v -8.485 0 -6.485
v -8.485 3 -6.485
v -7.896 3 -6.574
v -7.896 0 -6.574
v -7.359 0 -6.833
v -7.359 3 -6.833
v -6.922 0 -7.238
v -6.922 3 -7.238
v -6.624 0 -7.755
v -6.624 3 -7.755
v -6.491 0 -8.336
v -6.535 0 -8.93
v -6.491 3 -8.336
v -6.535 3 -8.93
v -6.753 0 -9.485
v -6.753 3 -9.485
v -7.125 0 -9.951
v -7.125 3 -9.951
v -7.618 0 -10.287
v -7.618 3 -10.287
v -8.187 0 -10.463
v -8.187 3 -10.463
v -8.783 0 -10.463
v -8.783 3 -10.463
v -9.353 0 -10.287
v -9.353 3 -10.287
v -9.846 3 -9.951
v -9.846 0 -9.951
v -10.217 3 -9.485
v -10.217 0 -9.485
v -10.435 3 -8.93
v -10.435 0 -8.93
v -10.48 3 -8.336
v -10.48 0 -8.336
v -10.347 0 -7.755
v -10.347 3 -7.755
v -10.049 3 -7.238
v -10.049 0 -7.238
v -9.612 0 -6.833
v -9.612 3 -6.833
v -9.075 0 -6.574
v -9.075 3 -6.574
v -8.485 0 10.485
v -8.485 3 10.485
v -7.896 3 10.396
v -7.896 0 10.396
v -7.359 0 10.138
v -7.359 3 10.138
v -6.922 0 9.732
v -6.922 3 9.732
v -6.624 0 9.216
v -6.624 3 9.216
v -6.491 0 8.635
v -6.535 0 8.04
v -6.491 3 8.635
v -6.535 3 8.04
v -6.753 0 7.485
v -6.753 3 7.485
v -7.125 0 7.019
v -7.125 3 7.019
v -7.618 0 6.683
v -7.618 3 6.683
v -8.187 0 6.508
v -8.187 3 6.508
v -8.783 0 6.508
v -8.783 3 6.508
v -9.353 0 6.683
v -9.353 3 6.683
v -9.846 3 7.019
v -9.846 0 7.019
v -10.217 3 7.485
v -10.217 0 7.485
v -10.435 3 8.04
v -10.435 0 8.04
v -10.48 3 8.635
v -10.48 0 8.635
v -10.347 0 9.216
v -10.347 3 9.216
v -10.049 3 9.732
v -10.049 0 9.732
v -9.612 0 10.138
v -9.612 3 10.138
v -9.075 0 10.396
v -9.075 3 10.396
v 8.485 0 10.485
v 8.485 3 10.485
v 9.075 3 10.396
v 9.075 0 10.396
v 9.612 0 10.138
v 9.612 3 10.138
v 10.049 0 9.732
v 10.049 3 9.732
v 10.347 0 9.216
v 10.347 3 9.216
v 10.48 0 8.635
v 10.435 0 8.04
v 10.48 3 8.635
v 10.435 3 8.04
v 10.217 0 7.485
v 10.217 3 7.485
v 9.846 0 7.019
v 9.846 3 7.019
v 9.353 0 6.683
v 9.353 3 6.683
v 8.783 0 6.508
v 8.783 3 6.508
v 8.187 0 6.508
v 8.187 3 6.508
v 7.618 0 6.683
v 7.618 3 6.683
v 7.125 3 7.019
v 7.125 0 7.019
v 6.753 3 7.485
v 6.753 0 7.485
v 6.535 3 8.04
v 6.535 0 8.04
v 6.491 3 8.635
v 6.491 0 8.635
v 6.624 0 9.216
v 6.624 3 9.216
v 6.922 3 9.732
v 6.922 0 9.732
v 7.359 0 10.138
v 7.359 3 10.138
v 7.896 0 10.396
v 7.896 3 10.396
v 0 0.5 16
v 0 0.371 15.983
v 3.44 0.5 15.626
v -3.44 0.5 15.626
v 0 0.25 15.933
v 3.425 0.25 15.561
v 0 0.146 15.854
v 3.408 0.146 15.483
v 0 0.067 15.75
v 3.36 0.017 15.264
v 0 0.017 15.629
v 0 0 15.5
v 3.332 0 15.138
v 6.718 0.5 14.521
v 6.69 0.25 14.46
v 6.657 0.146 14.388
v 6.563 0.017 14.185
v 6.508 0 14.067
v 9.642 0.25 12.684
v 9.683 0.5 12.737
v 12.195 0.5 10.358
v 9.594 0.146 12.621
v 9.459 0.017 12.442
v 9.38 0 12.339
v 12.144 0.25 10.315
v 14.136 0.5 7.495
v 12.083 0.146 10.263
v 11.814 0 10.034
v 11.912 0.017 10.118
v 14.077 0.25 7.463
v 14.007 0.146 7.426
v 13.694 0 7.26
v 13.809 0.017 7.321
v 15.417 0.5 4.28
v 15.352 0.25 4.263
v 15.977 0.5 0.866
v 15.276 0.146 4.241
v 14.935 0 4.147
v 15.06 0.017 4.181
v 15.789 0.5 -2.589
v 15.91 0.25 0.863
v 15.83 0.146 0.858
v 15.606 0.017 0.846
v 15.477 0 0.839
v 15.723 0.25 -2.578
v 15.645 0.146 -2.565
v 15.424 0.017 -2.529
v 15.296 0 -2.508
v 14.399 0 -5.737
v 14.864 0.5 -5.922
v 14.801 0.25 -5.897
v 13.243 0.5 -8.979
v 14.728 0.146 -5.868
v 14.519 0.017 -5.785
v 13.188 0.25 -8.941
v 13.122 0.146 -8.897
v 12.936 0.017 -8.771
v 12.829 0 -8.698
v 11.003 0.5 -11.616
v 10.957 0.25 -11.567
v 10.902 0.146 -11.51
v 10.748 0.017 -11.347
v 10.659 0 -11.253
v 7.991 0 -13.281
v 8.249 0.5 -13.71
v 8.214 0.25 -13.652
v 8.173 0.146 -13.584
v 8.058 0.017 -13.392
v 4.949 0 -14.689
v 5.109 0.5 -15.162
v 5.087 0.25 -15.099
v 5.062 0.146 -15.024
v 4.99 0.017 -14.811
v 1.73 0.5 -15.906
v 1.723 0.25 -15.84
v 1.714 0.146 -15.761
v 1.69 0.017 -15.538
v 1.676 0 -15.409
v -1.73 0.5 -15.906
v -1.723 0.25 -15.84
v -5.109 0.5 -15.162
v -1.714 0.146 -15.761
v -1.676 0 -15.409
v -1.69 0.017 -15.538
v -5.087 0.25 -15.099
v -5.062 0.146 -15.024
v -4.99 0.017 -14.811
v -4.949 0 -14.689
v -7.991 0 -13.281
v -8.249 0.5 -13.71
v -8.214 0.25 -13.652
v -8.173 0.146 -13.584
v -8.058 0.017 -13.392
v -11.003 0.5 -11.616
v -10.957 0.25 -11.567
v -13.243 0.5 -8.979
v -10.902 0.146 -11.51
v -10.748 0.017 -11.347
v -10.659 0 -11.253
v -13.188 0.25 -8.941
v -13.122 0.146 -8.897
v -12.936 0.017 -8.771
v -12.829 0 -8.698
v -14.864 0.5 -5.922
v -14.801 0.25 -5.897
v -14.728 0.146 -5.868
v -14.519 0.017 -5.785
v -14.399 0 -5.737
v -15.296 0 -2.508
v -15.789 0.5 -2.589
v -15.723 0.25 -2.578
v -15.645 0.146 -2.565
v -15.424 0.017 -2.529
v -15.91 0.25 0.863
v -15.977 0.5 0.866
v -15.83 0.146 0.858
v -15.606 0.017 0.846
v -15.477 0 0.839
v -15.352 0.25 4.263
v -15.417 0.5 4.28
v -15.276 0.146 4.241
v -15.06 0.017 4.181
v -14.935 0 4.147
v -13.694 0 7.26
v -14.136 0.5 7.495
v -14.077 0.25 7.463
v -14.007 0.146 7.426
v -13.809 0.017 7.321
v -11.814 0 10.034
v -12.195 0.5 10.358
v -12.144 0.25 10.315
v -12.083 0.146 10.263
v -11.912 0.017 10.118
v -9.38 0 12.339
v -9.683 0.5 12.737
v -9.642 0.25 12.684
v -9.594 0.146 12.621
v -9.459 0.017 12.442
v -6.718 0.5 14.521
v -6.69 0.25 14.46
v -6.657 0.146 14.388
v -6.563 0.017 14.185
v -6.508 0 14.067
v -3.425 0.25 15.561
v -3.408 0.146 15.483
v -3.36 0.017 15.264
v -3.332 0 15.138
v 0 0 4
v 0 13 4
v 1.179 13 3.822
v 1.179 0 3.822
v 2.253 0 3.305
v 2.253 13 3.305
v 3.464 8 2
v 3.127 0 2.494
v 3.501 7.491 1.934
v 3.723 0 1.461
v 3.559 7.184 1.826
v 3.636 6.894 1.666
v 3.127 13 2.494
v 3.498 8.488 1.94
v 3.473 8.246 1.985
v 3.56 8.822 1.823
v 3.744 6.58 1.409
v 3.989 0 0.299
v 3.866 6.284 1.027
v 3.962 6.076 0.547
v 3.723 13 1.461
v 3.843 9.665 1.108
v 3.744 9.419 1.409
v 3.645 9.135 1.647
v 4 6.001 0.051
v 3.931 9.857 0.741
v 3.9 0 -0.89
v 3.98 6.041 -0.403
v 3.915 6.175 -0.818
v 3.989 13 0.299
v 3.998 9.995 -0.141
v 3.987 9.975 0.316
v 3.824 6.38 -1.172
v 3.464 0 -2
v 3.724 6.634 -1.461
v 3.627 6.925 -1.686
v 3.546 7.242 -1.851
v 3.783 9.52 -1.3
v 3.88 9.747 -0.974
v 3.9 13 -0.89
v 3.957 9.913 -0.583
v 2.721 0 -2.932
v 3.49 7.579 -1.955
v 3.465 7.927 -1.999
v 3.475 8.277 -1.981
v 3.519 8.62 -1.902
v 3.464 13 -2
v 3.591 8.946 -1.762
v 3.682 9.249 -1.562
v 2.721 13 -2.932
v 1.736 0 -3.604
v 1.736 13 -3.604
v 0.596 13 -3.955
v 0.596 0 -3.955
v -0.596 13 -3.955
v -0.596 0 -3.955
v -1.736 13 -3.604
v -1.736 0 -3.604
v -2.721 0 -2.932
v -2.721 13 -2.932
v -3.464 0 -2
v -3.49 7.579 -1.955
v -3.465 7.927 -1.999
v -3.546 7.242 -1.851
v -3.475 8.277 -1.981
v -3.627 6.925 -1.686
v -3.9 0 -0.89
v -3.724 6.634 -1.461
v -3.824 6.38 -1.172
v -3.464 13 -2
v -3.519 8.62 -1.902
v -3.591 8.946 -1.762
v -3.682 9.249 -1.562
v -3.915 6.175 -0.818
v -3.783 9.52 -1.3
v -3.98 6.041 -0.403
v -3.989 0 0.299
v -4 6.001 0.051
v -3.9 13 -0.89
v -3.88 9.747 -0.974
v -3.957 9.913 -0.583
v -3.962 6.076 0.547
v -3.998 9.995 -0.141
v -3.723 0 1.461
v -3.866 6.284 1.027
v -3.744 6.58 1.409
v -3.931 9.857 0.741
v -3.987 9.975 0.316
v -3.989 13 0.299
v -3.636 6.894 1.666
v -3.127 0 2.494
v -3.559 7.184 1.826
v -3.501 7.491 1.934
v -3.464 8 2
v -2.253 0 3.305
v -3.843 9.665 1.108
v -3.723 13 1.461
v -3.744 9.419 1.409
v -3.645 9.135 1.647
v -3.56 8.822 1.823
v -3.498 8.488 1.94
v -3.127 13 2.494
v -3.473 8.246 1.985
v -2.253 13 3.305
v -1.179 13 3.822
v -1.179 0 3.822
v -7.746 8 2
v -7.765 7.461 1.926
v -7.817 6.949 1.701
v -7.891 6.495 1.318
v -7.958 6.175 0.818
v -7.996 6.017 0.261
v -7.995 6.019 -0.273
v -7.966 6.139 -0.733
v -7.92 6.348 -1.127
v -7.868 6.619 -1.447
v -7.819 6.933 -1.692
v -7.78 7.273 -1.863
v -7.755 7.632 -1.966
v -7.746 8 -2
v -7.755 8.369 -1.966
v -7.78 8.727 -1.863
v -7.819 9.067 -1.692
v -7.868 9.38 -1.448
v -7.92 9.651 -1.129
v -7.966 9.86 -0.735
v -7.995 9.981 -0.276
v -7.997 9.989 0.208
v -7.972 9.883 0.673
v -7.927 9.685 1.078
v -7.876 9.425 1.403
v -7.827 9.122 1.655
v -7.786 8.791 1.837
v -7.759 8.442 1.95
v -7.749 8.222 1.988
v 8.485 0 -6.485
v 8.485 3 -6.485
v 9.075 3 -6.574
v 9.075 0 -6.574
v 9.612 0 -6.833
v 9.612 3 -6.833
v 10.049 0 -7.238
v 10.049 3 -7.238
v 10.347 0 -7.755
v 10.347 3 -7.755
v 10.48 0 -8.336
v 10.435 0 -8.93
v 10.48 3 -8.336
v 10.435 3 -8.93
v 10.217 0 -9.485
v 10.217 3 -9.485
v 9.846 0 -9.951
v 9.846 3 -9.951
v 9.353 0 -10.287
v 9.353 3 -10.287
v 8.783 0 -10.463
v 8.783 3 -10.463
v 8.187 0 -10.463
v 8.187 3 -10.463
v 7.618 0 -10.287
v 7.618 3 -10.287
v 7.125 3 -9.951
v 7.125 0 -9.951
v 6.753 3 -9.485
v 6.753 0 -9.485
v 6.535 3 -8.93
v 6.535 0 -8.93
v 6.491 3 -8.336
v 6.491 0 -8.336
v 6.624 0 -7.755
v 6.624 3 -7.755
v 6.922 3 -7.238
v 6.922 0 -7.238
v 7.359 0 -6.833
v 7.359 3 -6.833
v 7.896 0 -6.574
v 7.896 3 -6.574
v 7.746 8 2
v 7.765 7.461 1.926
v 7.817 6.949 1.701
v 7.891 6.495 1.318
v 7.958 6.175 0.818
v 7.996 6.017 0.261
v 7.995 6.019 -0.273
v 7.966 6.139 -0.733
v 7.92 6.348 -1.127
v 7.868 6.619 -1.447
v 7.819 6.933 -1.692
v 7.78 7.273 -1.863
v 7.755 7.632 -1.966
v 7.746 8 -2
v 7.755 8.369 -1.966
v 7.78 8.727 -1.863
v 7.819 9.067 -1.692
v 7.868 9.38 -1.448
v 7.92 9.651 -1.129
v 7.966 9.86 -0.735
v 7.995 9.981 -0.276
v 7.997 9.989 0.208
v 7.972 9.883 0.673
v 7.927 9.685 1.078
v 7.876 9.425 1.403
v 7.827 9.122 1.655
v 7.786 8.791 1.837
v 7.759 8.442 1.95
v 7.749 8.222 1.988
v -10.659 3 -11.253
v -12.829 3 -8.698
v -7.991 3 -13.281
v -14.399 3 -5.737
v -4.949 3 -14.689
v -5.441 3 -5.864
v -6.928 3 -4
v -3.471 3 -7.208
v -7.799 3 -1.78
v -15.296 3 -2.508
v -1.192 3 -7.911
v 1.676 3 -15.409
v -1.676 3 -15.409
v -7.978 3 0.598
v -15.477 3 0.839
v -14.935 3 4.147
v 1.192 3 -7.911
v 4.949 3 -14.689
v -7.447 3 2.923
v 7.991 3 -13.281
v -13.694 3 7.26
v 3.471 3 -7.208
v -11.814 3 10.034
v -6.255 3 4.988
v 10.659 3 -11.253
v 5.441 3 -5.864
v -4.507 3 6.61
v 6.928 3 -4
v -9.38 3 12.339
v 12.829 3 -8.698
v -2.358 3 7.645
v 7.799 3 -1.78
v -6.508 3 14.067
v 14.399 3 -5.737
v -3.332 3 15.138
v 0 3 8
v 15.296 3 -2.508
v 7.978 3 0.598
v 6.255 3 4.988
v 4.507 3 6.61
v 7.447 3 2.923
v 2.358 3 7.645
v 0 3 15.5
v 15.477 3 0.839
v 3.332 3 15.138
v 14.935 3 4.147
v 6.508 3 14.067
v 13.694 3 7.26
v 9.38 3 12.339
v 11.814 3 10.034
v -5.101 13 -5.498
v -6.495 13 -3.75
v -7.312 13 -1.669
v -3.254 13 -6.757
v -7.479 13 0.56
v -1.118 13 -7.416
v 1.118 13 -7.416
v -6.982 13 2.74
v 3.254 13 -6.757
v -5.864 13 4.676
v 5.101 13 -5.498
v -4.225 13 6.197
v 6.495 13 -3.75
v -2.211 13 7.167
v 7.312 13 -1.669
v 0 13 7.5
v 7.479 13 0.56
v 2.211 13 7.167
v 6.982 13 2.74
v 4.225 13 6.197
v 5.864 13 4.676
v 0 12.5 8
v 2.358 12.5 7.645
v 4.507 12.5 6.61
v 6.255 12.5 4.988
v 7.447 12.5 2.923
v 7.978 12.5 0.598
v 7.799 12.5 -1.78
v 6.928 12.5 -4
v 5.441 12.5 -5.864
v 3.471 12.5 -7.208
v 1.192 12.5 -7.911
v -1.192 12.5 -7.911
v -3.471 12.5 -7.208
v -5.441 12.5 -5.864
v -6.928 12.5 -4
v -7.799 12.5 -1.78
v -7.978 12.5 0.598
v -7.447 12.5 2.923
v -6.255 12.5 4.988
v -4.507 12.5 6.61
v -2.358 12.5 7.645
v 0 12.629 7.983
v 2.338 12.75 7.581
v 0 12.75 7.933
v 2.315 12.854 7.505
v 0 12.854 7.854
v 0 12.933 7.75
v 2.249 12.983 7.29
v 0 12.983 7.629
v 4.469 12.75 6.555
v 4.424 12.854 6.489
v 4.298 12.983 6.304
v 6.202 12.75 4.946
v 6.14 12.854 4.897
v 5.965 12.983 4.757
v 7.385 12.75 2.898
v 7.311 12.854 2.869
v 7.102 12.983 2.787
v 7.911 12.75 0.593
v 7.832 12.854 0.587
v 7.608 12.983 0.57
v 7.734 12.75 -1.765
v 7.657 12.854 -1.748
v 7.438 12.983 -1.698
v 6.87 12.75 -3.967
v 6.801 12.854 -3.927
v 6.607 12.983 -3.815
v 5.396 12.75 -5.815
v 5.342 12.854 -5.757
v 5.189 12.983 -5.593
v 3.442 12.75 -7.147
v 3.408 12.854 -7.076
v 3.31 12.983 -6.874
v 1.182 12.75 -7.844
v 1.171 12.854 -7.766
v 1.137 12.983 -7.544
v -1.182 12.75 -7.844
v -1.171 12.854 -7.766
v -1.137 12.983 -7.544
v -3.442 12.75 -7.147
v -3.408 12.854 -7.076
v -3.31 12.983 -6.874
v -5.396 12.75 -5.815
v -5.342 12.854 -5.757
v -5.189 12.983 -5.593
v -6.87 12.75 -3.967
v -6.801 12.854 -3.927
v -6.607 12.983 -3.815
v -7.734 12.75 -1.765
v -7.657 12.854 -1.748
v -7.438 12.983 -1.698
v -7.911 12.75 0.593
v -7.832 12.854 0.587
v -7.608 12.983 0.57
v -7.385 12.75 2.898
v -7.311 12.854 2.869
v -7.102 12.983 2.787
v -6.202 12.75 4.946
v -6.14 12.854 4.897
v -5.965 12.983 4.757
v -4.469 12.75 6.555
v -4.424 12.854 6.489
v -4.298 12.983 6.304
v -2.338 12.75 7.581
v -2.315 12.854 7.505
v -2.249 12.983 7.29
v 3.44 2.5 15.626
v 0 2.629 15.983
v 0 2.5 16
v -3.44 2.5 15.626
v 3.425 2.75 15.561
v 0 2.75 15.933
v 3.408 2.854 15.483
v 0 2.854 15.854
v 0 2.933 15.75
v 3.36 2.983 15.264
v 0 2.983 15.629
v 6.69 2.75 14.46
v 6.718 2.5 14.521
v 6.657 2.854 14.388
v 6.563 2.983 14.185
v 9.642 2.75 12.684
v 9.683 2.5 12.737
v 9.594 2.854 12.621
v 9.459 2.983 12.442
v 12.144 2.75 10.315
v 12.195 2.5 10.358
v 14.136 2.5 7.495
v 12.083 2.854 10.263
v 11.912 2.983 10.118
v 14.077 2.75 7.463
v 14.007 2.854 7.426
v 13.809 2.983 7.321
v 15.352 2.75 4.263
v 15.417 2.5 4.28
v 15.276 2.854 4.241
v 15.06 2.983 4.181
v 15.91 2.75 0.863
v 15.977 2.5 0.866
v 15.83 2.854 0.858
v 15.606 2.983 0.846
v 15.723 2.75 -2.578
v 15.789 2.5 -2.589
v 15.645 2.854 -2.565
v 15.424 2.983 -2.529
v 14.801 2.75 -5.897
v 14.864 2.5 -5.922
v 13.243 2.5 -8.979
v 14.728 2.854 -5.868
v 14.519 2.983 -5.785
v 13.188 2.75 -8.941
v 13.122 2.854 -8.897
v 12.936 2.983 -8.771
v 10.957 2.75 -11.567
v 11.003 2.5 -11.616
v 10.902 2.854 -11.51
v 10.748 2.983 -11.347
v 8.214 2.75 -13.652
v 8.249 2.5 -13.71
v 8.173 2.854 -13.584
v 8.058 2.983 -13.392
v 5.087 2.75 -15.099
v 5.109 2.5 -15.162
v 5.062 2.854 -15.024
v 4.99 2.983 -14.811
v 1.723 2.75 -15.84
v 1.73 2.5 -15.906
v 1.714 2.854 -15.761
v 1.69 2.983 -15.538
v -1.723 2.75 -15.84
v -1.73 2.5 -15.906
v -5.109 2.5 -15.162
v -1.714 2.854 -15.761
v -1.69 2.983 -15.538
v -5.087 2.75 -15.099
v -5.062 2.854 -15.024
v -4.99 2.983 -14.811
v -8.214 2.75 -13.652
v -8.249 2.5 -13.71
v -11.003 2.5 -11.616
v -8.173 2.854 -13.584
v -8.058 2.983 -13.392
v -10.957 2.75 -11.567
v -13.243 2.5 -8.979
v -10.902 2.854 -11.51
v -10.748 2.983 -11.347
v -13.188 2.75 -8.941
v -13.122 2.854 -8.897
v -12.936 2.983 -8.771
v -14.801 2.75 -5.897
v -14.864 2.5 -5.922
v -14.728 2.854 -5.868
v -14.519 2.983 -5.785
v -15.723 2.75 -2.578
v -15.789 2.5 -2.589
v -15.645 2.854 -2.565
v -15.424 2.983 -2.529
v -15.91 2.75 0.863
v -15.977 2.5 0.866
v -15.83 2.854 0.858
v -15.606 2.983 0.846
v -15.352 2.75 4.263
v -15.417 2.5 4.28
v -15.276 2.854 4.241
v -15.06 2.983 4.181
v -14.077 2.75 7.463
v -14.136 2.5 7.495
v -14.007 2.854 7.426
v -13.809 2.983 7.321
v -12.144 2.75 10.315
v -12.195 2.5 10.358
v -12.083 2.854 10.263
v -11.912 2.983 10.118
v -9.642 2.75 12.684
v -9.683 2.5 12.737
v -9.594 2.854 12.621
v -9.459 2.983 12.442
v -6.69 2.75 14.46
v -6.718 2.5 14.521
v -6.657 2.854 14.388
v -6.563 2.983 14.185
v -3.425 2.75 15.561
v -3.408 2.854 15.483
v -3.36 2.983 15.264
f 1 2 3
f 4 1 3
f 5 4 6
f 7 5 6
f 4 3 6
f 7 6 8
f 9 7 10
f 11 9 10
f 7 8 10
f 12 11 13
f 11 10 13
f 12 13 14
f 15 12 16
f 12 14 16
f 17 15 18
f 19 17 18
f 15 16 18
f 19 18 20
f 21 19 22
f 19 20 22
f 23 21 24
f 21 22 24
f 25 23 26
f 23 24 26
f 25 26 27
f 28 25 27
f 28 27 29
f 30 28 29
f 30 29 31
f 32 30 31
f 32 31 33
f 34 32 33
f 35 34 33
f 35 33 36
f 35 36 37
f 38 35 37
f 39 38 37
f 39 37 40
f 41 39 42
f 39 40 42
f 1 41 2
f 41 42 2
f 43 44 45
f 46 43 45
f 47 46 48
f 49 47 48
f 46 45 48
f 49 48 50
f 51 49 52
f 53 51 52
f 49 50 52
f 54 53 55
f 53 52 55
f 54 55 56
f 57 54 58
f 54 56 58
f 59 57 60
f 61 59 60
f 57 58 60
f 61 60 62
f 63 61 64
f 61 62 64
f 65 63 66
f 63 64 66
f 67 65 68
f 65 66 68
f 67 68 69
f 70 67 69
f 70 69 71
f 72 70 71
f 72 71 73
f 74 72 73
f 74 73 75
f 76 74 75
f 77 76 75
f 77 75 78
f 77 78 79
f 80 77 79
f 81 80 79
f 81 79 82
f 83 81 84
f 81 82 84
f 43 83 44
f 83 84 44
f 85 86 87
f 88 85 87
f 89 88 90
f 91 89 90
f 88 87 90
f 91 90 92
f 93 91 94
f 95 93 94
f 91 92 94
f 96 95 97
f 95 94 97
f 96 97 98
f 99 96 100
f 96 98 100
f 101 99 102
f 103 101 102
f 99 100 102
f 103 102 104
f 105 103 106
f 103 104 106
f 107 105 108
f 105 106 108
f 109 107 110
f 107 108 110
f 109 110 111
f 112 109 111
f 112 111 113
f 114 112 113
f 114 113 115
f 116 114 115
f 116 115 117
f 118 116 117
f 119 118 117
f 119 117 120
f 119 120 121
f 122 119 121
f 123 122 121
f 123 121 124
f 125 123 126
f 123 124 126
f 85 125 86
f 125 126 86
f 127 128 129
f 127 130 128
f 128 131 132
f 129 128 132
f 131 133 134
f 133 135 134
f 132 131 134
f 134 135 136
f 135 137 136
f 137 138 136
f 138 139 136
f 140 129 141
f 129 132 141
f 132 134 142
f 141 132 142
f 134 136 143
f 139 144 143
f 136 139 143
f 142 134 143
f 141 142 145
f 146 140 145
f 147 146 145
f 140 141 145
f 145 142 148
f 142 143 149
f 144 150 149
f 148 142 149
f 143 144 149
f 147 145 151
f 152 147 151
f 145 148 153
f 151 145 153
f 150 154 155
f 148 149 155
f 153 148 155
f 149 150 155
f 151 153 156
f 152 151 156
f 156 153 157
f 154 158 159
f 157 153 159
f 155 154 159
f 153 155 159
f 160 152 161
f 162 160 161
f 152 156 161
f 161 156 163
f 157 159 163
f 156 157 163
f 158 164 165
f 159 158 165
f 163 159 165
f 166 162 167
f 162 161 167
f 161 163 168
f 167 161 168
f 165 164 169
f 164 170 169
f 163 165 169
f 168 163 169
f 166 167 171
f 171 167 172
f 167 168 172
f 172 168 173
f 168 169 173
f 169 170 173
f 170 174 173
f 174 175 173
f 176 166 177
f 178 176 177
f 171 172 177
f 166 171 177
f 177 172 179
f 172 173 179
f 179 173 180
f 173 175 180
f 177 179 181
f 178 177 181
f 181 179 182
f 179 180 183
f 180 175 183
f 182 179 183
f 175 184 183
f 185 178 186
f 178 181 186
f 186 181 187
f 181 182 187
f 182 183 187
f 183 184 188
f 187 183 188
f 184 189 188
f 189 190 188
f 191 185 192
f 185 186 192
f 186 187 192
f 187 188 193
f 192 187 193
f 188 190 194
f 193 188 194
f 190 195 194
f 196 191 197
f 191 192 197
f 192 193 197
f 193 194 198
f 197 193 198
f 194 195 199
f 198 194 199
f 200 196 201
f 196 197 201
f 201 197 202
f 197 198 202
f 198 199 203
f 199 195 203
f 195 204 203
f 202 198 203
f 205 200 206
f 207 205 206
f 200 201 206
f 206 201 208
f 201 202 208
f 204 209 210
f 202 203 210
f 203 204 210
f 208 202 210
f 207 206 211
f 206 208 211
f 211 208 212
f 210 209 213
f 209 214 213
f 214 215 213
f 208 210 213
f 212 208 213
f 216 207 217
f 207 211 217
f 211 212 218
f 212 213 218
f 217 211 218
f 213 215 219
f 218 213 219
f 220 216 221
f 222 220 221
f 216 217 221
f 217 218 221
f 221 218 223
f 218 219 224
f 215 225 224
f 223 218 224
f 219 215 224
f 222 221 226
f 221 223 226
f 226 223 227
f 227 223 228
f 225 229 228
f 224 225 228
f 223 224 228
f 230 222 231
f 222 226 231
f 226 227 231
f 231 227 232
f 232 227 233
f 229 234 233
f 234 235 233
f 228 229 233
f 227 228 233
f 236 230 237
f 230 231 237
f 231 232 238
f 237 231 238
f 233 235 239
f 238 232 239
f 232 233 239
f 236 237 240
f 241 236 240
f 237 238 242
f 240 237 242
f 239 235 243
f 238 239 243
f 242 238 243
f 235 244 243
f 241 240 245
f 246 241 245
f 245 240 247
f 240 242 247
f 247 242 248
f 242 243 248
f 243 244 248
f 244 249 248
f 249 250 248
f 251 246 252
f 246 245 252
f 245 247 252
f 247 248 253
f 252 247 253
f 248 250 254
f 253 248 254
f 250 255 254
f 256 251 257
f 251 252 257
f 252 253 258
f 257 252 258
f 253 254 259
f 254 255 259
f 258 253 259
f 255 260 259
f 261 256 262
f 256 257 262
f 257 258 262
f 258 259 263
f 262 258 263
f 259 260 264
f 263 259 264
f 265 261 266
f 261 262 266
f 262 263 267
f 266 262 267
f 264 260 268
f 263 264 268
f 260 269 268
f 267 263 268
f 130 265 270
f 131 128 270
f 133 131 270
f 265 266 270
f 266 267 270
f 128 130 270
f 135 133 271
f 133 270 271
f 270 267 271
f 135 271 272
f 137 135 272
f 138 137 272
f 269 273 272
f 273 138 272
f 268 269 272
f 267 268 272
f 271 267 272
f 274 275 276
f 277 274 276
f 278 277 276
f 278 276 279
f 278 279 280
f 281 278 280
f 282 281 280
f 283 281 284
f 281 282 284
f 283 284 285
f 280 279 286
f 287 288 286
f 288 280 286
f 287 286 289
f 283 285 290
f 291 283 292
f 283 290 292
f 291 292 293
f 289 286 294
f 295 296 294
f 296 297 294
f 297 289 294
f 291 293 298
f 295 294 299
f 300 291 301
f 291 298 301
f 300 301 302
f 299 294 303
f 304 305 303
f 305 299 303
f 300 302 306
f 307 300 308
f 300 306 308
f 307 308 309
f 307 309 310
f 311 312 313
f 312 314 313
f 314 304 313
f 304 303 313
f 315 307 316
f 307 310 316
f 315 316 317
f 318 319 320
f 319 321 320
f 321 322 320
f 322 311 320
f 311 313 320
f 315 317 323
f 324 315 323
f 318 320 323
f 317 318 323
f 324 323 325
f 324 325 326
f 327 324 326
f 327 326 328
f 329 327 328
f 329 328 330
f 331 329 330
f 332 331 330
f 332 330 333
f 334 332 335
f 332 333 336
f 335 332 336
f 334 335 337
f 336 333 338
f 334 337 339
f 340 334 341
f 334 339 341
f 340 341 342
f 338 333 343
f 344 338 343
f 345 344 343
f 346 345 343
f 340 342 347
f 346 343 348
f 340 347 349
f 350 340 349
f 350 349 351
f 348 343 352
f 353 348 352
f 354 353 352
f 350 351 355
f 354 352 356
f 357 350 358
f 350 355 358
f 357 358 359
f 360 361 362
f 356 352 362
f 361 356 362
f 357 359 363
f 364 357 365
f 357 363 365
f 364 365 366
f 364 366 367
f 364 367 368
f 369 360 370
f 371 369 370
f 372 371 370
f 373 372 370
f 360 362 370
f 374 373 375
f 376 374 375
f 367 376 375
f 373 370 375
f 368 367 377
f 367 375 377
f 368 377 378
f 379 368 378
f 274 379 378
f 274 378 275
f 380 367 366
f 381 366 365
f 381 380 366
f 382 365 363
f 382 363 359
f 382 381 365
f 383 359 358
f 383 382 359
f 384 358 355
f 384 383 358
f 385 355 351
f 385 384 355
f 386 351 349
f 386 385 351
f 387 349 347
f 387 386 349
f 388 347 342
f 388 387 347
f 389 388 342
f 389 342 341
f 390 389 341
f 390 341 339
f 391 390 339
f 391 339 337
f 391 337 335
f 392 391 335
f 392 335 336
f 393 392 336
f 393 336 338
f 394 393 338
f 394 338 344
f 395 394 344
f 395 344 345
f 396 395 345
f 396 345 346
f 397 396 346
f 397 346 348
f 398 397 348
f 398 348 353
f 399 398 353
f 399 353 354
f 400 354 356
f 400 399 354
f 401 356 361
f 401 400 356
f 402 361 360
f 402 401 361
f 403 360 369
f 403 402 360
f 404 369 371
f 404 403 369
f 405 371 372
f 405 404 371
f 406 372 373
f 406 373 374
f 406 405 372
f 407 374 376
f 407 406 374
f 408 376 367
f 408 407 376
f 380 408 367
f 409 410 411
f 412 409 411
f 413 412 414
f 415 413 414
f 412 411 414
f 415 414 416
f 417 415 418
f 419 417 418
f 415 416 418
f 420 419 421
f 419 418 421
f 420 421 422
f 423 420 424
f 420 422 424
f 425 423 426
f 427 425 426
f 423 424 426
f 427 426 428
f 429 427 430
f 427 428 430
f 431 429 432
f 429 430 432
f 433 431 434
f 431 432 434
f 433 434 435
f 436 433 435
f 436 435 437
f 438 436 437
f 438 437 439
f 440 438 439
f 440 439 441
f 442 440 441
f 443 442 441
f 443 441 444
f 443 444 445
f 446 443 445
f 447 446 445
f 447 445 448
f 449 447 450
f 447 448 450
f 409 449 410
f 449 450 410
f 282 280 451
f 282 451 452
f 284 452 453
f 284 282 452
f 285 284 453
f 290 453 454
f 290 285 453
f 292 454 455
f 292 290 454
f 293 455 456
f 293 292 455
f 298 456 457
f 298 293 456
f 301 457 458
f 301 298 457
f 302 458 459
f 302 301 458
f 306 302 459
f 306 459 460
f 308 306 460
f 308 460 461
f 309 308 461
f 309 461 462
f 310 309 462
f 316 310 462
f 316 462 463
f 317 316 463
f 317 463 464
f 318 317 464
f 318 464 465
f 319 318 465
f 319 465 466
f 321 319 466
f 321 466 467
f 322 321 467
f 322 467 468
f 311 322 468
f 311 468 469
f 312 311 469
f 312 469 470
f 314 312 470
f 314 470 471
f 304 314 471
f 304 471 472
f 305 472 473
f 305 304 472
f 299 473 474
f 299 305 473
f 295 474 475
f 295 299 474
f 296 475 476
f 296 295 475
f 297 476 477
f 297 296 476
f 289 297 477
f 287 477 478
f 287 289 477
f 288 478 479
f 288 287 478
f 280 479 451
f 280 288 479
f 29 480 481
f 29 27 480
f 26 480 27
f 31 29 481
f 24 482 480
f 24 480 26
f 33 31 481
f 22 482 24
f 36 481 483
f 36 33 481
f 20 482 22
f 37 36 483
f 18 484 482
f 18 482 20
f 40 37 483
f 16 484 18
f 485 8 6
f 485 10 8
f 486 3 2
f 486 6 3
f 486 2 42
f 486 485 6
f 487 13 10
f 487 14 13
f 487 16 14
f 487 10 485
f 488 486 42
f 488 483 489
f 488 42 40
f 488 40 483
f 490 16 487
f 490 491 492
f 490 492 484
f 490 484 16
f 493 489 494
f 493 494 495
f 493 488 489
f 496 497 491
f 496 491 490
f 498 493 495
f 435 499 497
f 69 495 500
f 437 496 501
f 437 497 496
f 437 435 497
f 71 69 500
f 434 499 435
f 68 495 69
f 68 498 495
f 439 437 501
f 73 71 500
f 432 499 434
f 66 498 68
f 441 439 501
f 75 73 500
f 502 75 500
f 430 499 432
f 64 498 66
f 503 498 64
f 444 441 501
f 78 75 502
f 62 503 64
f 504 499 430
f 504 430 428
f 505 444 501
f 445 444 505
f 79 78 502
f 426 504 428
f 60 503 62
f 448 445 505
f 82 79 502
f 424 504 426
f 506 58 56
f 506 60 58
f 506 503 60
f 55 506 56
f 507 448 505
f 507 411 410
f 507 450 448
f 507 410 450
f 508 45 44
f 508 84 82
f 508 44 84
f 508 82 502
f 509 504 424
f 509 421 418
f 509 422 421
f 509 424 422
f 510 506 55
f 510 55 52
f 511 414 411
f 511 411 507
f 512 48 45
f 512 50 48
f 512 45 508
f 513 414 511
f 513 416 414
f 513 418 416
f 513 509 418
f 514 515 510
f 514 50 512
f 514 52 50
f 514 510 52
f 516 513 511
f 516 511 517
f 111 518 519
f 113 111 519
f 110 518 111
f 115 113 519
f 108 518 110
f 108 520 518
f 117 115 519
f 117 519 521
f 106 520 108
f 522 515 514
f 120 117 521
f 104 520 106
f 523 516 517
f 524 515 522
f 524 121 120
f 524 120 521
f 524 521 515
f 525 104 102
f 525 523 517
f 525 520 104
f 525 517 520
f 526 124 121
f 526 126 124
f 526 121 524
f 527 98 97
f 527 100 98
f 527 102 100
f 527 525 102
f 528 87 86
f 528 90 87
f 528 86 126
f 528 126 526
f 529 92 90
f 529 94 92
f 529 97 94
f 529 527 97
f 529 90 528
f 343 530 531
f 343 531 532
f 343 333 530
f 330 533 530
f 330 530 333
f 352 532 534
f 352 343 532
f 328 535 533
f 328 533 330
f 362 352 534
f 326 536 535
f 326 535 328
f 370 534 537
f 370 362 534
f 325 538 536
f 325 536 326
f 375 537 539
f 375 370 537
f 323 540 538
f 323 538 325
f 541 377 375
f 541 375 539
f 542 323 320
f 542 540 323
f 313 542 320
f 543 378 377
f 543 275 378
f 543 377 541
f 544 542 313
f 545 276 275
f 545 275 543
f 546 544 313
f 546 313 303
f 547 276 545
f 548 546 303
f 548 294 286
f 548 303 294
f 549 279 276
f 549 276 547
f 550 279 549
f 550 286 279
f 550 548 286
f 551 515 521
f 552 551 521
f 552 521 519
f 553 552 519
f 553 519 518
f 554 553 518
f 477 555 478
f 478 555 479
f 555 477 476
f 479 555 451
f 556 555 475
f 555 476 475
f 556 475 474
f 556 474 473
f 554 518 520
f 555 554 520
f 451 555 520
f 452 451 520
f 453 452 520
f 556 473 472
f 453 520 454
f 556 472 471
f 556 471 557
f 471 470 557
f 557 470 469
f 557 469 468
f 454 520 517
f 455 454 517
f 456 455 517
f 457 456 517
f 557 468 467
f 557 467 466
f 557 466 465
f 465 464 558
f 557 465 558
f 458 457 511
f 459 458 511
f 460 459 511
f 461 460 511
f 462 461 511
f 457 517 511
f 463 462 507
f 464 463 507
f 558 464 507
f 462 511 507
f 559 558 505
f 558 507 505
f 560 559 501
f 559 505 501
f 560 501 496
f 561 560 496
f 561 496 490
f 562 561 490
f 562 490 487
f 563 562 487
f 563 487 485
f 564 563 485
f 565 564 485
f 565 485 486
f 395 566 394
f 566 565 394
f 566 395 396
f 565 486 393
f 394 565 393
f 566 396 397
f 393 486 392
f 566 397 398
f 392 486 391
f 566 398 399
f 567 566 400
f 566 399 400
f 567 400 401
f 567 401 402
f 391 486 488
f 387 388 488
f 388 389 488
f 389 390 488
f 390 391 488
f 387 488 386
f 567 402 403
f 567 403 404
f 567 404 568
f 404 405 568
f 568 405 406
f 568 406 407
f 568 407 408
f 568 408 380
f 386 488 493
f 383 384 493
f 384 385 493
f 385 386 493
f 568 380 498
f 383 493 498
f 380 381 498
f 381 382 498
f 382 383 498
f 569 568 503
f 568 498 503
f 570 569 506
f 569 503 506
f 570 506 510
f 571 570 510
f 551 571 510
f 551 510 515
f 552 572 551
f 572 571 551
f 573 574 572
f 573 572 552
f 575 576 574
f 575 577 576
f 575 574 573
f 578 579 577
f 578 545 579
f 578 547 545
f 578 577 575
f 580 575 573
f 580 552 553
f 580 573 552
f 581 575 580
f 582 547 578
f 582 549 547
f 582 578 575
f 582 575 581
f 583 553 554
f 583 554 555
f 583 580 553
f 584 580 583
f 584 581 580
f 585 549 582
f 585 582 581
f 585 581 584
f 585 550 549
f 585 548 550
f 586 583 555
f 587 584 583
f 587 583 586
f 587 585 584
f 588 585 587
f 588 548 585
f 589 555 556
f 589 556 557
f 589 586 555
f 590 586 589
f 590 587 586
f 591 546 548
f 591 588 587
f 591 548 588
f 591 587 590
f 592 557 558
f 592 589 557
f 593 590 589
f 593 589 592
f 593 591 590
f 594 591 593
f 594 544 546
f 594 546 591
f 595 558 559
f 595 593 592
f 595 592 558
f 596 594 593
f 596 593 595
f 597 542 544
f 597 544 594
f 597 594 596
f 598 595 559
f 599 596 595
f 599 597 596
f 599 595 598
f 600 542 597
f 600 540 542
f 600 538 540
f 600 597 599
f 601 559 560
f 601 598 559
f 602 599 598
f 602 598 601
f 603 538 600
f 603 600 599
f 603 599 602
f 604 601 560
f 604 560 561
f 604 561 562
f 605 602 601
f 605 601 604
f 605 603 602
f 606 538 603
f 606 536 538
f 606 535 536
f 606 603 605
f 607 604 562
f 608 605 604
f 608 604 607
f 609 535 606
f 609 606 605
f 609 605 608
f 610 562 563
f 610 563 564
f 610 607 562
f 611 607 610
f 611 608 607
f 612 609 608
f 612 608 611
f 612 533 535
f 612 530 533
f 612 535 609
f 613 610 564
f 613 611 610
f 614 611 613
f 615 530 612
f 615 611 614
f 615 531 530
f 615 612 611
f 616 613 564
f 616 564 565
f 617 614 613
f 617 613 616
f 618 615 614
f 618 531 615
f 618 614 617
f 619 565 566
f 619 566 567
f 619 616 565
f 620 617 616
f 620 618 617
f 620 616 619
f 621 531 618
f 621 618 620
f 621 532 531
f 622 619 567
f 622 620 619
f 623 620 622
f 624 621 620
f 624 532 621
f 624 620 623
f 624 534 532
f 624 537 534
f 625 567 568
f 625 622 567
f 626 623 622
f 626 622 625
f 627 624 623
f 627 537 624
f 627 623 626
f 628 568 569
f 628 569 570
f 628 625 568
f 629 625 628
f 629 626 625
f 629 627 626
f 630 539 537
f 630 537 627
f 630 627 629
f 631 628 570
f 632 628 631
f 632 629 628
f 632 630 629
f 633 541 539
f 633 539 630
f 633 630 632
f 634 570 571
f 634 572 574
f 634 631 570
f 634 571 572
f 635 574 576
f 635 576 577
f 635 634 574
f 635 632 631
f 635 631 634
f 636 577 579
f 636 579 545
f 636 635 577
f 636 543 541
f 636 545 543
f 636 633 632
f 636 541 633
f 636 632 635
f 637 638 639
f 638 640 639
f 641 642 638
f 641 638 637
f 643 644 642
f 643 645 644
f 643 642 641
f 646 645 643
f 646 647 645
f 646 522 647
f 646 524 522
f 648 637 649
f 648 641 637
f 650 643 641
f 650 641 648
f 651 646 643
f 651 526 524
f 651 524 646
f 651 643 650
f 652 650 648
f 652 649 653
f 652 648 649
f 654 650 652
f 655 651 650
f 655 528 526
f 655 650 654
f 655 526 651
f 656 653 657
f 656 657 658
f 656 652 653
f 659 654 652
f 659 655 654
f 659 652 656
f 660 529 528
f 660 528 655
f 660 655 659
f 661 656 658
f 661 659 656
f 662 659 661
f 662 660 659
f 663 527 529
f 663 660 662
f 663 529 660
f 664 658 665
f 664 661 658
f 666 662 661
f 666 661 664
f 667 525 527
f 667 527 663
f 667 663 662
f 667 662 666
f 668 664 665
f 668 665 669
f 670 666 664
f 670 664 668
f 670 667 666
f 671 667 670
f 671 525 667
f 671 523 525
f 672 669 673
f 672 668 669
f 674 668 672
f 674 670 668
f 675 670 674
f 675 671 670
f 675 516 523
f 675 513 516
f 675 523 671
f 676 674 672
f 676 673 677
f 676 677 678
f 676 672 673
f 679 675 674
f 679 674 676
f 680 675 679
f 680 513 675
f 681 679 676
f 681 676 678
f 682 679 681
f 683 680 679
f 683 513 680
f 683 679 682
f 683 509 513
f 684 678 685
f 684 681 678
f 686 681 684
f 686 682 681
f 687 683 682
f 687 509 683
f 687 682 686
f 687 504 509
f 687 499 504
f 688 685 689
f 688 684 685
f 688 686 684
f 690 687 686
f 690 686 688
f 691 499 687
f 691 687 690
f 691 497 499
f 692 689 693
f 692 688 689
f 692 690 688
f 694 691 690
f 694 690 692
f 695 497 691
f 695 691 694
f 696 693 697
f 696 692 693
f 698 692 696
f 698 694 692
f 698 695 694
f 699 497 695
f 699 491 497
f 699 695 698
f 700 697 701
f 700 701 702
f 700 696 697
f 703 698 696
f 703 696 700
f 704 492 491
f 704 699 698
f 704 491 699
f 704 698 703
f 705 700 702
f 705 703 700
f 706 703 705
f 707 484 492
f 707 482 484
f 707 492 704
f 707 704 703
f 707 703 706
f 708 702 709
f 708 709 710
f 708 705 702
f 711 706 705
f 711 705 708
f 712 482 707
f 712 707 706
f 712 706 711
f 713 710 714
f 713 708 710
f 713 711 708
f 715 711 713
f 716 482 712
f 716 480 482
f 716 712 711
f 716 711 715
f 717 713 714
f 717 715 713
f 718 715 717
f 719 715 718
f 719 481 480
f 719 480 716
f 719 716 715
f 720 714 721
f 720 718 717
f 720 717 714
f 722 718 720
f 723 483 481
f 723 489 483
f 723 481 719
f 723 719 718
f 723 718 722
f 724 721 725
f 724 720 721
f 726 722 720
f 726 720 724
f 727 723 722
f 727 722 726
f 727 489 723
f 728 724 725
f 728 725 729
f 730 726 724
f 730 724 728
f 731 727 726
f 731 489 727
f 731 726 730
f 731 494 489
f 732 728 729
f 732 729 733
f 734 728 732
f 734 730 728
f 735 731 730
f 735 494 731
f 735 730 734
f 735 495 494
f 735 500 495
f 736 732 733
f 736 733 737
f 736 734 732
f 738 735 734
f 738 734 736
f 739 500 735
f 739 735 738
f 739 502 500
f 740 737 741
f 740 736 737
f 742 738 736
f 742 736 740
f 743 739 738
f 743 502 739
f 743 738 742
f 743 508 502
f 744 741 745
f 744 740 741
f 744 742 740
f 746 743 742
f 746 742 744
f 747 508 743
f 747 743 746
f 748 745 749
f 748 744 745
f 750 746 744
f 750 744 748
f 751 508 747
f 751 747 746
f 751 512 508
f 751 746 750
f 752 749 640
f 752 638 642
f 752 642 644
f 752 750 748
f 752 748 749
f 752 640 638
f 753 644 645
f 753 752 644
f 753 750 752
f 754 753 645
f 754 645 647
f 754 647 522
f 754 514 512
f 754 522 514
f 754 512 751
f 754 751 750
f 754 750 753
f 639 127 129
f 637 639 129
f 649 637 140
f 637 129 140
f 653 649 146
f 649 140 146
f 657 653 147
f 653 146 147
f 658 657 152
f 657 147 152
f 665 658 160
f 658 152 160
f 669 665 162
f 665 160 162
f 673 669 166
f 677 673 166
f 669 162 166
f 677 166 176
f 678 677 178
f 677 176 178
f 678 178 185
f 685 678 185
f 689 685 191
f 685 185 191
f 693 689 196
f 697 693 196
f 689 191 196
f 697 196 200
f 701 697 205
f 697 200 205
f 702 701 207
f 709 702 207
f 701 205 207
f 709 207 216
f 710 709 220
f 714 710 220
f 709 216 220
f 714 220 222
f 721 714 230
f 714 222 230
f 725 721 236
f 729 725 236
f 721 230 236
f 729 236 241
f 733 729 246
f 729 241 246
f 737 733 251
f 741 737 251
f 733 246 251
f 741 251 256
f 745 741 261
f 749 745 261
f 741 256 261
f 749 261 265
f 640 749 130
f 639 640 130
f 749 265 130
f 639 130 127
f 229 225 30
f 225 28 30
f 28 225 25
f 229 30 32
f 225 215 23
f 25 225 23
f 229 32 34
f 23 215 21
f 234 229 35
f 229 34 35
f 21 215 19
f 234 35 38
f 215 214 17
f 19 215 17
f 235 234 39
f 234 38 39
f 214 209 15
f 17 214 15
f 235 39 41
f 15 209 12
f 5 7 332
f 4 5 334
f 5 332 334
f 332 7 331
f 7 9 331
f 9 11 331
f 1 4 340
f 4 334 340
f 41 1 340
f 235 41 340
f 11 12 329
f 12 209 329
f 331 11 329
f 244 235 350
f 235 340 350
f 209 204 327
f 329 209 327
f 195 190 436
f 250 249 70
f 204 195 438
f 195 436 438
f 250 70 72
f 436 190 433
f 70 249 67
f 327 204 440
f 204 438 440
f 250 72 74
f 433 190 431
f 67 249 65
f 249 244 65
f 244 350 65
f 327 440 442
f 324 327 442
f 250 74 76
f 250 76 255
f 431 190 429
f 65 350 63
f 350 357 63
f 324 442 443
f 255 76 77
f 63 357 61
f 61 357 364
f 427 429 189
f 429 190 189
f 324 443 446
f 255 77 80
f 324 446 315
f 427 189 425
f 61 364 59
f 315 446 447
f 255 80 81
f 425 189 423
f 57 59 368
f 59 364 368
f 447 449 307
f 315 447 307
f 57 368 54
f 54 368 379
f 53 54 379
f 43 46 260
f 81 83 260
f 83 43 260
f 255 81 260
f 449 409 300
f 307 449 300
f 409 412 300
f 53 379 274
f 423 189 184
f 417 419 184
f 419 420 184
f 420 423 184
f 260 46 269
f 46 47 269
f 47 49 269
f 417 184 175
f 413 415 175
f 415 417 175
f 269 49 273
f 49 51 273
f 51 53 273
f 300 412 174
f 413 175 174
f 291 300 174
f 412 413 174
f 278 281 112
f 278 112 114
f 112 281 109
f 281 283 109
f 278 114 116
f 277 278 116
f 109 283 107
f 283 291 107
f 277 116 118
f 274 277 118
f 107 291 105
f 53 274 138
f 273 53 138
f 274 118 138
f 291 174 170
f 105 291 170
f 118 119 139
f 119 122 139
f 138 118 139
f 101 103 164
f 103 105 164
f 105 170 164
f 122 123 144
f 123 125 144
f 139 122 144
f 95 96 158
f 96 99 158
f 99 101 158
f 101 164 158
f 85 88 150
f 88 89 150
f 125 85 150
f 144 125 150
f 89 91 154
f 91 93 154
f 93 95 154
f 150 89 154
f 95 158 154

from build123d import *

# Parameters (mm, degrees)
SKETCH1_R               = 16
BOSS_EXTRUDE1_DEPTH     = 3
SKETCH2_R               = 8
BOSS_EXTRUDE2_DEPTH     = 10
SKETCH3_R               = 4
CUT_EXTRUDE1_DEPTH      = 13
SKETCH4_R               = 2
CUT_EXTRUDE3_DEPTH      = 3
CUT_EXTRUDE4_DEPTH      = 10
CUT_EXTRUDE4_DEPTH_BACK = 24
SKETCH6_R               = 2
FILLET1_R               = 0.5
FILLET3_R               = 0.5


with BuildPart() as part:
    # Sketch1 → Boss-Extrude1 (new body)
    with BuildSketch(Plane(origin=(0, 0, 0), x_dir=(1, 0, 0), z_dir=(0, 1, 0))):
        with Locations(Location((0, 0, 0), (0, 0, 270))):
            Circle(SKETCH1_R)
    extrude(amount=BOSS_EXTRUDE1_DEPTH)

    # Sketch2 → Boss-Extrude2 (add)
    with BuildSketch(Plane(origin=(0, 3, 0), x_dir=(1, 0, 0), z_dir=(0, 1, 0))):
        with Locations(Location((0, 0, 0), (0, 0, 270))):
            Circle(SKETCH2_R)
    extrude(amount=BOSS_EXTRUDE2_DEPTH)

    # Sketch3 → Cut-Extrude1 (cut)
    with BuildSketch(Plane(origin=(0, 13, 0), x_dir=(1, 0, 0), z_dir=(0, 1, 0))):
        with Locations(Location((0, 0, 0), (0, 0, 270))):
            Circle(SKETCH3_R)
    extrude(amount=-CUT_EXTRUDE1_DEPTH, mode=Mode.SUBTRACT)

    # Sketch4 → Cut-Extrude3 (cut)
    with BuildSketch(Plane(origin=(0, 3, 0), x_dir=(1, 0, 0), z_dir=(0, 1, 0))):
        with Locations(Location((8.485281374, 8.485281374, 0), (0, 0, 270))):
            Circle(SKETCH4_R)
        with Locations(Location((8.485281374, -8.485281374, 0), (0, 0, 270))):
            Circle(SKETCH4_R)
        with Locations(Location((-8.485281374, -8.485281374, 0), (0, 0, 270))):
            Circle(SKETCH4_R)
        with Locations(Location((-8.485281374, 8.485281374, 0), (0, 0, 270))):
            Circle(SKETCH4_R)
    extrude(amount=-CUT_EXTRUDE3_DEPTH, mode=Mode.SUBTRACT)

    # Sketch6 → Cut-Extrude4 (cut, two sides: drawn at the far end of the back side and taken through both)
    with BuildSketch(Plane(origin=(0, 0, 0), x_dir=(0, 0, -1), z_dir=(1, 0, 0)).offset(-CUT_EXTRUDE4_DEPTH_BACK)):
        with Locations(Location((0, 8, 0), (0, 0, 180))):
            Circle(SKETCH6_R)
    extrude(amount=CUT_EXTRUDE4_DEPTH + CUT_EXTRUDE4_DEPTH_BACK, mode=Mode.SUBTRACT)

    # Fillet1
    fillet1_edges = [part.edges().sort_by_distance(p)[0] for p in [
        (0, 0, -16),
    ]]
    fillet(fillet1_edges, radius=FILLET1_R)

    # Fillet3
    fillet3_edges = [part.edges().sort_by_distance(p)[0] for p in [
        (0, 3, -16),
        (0, 13, -8),
    ]]
    fillet(fillet3_edges, radius=FILLET3_R)


solid = part.part
